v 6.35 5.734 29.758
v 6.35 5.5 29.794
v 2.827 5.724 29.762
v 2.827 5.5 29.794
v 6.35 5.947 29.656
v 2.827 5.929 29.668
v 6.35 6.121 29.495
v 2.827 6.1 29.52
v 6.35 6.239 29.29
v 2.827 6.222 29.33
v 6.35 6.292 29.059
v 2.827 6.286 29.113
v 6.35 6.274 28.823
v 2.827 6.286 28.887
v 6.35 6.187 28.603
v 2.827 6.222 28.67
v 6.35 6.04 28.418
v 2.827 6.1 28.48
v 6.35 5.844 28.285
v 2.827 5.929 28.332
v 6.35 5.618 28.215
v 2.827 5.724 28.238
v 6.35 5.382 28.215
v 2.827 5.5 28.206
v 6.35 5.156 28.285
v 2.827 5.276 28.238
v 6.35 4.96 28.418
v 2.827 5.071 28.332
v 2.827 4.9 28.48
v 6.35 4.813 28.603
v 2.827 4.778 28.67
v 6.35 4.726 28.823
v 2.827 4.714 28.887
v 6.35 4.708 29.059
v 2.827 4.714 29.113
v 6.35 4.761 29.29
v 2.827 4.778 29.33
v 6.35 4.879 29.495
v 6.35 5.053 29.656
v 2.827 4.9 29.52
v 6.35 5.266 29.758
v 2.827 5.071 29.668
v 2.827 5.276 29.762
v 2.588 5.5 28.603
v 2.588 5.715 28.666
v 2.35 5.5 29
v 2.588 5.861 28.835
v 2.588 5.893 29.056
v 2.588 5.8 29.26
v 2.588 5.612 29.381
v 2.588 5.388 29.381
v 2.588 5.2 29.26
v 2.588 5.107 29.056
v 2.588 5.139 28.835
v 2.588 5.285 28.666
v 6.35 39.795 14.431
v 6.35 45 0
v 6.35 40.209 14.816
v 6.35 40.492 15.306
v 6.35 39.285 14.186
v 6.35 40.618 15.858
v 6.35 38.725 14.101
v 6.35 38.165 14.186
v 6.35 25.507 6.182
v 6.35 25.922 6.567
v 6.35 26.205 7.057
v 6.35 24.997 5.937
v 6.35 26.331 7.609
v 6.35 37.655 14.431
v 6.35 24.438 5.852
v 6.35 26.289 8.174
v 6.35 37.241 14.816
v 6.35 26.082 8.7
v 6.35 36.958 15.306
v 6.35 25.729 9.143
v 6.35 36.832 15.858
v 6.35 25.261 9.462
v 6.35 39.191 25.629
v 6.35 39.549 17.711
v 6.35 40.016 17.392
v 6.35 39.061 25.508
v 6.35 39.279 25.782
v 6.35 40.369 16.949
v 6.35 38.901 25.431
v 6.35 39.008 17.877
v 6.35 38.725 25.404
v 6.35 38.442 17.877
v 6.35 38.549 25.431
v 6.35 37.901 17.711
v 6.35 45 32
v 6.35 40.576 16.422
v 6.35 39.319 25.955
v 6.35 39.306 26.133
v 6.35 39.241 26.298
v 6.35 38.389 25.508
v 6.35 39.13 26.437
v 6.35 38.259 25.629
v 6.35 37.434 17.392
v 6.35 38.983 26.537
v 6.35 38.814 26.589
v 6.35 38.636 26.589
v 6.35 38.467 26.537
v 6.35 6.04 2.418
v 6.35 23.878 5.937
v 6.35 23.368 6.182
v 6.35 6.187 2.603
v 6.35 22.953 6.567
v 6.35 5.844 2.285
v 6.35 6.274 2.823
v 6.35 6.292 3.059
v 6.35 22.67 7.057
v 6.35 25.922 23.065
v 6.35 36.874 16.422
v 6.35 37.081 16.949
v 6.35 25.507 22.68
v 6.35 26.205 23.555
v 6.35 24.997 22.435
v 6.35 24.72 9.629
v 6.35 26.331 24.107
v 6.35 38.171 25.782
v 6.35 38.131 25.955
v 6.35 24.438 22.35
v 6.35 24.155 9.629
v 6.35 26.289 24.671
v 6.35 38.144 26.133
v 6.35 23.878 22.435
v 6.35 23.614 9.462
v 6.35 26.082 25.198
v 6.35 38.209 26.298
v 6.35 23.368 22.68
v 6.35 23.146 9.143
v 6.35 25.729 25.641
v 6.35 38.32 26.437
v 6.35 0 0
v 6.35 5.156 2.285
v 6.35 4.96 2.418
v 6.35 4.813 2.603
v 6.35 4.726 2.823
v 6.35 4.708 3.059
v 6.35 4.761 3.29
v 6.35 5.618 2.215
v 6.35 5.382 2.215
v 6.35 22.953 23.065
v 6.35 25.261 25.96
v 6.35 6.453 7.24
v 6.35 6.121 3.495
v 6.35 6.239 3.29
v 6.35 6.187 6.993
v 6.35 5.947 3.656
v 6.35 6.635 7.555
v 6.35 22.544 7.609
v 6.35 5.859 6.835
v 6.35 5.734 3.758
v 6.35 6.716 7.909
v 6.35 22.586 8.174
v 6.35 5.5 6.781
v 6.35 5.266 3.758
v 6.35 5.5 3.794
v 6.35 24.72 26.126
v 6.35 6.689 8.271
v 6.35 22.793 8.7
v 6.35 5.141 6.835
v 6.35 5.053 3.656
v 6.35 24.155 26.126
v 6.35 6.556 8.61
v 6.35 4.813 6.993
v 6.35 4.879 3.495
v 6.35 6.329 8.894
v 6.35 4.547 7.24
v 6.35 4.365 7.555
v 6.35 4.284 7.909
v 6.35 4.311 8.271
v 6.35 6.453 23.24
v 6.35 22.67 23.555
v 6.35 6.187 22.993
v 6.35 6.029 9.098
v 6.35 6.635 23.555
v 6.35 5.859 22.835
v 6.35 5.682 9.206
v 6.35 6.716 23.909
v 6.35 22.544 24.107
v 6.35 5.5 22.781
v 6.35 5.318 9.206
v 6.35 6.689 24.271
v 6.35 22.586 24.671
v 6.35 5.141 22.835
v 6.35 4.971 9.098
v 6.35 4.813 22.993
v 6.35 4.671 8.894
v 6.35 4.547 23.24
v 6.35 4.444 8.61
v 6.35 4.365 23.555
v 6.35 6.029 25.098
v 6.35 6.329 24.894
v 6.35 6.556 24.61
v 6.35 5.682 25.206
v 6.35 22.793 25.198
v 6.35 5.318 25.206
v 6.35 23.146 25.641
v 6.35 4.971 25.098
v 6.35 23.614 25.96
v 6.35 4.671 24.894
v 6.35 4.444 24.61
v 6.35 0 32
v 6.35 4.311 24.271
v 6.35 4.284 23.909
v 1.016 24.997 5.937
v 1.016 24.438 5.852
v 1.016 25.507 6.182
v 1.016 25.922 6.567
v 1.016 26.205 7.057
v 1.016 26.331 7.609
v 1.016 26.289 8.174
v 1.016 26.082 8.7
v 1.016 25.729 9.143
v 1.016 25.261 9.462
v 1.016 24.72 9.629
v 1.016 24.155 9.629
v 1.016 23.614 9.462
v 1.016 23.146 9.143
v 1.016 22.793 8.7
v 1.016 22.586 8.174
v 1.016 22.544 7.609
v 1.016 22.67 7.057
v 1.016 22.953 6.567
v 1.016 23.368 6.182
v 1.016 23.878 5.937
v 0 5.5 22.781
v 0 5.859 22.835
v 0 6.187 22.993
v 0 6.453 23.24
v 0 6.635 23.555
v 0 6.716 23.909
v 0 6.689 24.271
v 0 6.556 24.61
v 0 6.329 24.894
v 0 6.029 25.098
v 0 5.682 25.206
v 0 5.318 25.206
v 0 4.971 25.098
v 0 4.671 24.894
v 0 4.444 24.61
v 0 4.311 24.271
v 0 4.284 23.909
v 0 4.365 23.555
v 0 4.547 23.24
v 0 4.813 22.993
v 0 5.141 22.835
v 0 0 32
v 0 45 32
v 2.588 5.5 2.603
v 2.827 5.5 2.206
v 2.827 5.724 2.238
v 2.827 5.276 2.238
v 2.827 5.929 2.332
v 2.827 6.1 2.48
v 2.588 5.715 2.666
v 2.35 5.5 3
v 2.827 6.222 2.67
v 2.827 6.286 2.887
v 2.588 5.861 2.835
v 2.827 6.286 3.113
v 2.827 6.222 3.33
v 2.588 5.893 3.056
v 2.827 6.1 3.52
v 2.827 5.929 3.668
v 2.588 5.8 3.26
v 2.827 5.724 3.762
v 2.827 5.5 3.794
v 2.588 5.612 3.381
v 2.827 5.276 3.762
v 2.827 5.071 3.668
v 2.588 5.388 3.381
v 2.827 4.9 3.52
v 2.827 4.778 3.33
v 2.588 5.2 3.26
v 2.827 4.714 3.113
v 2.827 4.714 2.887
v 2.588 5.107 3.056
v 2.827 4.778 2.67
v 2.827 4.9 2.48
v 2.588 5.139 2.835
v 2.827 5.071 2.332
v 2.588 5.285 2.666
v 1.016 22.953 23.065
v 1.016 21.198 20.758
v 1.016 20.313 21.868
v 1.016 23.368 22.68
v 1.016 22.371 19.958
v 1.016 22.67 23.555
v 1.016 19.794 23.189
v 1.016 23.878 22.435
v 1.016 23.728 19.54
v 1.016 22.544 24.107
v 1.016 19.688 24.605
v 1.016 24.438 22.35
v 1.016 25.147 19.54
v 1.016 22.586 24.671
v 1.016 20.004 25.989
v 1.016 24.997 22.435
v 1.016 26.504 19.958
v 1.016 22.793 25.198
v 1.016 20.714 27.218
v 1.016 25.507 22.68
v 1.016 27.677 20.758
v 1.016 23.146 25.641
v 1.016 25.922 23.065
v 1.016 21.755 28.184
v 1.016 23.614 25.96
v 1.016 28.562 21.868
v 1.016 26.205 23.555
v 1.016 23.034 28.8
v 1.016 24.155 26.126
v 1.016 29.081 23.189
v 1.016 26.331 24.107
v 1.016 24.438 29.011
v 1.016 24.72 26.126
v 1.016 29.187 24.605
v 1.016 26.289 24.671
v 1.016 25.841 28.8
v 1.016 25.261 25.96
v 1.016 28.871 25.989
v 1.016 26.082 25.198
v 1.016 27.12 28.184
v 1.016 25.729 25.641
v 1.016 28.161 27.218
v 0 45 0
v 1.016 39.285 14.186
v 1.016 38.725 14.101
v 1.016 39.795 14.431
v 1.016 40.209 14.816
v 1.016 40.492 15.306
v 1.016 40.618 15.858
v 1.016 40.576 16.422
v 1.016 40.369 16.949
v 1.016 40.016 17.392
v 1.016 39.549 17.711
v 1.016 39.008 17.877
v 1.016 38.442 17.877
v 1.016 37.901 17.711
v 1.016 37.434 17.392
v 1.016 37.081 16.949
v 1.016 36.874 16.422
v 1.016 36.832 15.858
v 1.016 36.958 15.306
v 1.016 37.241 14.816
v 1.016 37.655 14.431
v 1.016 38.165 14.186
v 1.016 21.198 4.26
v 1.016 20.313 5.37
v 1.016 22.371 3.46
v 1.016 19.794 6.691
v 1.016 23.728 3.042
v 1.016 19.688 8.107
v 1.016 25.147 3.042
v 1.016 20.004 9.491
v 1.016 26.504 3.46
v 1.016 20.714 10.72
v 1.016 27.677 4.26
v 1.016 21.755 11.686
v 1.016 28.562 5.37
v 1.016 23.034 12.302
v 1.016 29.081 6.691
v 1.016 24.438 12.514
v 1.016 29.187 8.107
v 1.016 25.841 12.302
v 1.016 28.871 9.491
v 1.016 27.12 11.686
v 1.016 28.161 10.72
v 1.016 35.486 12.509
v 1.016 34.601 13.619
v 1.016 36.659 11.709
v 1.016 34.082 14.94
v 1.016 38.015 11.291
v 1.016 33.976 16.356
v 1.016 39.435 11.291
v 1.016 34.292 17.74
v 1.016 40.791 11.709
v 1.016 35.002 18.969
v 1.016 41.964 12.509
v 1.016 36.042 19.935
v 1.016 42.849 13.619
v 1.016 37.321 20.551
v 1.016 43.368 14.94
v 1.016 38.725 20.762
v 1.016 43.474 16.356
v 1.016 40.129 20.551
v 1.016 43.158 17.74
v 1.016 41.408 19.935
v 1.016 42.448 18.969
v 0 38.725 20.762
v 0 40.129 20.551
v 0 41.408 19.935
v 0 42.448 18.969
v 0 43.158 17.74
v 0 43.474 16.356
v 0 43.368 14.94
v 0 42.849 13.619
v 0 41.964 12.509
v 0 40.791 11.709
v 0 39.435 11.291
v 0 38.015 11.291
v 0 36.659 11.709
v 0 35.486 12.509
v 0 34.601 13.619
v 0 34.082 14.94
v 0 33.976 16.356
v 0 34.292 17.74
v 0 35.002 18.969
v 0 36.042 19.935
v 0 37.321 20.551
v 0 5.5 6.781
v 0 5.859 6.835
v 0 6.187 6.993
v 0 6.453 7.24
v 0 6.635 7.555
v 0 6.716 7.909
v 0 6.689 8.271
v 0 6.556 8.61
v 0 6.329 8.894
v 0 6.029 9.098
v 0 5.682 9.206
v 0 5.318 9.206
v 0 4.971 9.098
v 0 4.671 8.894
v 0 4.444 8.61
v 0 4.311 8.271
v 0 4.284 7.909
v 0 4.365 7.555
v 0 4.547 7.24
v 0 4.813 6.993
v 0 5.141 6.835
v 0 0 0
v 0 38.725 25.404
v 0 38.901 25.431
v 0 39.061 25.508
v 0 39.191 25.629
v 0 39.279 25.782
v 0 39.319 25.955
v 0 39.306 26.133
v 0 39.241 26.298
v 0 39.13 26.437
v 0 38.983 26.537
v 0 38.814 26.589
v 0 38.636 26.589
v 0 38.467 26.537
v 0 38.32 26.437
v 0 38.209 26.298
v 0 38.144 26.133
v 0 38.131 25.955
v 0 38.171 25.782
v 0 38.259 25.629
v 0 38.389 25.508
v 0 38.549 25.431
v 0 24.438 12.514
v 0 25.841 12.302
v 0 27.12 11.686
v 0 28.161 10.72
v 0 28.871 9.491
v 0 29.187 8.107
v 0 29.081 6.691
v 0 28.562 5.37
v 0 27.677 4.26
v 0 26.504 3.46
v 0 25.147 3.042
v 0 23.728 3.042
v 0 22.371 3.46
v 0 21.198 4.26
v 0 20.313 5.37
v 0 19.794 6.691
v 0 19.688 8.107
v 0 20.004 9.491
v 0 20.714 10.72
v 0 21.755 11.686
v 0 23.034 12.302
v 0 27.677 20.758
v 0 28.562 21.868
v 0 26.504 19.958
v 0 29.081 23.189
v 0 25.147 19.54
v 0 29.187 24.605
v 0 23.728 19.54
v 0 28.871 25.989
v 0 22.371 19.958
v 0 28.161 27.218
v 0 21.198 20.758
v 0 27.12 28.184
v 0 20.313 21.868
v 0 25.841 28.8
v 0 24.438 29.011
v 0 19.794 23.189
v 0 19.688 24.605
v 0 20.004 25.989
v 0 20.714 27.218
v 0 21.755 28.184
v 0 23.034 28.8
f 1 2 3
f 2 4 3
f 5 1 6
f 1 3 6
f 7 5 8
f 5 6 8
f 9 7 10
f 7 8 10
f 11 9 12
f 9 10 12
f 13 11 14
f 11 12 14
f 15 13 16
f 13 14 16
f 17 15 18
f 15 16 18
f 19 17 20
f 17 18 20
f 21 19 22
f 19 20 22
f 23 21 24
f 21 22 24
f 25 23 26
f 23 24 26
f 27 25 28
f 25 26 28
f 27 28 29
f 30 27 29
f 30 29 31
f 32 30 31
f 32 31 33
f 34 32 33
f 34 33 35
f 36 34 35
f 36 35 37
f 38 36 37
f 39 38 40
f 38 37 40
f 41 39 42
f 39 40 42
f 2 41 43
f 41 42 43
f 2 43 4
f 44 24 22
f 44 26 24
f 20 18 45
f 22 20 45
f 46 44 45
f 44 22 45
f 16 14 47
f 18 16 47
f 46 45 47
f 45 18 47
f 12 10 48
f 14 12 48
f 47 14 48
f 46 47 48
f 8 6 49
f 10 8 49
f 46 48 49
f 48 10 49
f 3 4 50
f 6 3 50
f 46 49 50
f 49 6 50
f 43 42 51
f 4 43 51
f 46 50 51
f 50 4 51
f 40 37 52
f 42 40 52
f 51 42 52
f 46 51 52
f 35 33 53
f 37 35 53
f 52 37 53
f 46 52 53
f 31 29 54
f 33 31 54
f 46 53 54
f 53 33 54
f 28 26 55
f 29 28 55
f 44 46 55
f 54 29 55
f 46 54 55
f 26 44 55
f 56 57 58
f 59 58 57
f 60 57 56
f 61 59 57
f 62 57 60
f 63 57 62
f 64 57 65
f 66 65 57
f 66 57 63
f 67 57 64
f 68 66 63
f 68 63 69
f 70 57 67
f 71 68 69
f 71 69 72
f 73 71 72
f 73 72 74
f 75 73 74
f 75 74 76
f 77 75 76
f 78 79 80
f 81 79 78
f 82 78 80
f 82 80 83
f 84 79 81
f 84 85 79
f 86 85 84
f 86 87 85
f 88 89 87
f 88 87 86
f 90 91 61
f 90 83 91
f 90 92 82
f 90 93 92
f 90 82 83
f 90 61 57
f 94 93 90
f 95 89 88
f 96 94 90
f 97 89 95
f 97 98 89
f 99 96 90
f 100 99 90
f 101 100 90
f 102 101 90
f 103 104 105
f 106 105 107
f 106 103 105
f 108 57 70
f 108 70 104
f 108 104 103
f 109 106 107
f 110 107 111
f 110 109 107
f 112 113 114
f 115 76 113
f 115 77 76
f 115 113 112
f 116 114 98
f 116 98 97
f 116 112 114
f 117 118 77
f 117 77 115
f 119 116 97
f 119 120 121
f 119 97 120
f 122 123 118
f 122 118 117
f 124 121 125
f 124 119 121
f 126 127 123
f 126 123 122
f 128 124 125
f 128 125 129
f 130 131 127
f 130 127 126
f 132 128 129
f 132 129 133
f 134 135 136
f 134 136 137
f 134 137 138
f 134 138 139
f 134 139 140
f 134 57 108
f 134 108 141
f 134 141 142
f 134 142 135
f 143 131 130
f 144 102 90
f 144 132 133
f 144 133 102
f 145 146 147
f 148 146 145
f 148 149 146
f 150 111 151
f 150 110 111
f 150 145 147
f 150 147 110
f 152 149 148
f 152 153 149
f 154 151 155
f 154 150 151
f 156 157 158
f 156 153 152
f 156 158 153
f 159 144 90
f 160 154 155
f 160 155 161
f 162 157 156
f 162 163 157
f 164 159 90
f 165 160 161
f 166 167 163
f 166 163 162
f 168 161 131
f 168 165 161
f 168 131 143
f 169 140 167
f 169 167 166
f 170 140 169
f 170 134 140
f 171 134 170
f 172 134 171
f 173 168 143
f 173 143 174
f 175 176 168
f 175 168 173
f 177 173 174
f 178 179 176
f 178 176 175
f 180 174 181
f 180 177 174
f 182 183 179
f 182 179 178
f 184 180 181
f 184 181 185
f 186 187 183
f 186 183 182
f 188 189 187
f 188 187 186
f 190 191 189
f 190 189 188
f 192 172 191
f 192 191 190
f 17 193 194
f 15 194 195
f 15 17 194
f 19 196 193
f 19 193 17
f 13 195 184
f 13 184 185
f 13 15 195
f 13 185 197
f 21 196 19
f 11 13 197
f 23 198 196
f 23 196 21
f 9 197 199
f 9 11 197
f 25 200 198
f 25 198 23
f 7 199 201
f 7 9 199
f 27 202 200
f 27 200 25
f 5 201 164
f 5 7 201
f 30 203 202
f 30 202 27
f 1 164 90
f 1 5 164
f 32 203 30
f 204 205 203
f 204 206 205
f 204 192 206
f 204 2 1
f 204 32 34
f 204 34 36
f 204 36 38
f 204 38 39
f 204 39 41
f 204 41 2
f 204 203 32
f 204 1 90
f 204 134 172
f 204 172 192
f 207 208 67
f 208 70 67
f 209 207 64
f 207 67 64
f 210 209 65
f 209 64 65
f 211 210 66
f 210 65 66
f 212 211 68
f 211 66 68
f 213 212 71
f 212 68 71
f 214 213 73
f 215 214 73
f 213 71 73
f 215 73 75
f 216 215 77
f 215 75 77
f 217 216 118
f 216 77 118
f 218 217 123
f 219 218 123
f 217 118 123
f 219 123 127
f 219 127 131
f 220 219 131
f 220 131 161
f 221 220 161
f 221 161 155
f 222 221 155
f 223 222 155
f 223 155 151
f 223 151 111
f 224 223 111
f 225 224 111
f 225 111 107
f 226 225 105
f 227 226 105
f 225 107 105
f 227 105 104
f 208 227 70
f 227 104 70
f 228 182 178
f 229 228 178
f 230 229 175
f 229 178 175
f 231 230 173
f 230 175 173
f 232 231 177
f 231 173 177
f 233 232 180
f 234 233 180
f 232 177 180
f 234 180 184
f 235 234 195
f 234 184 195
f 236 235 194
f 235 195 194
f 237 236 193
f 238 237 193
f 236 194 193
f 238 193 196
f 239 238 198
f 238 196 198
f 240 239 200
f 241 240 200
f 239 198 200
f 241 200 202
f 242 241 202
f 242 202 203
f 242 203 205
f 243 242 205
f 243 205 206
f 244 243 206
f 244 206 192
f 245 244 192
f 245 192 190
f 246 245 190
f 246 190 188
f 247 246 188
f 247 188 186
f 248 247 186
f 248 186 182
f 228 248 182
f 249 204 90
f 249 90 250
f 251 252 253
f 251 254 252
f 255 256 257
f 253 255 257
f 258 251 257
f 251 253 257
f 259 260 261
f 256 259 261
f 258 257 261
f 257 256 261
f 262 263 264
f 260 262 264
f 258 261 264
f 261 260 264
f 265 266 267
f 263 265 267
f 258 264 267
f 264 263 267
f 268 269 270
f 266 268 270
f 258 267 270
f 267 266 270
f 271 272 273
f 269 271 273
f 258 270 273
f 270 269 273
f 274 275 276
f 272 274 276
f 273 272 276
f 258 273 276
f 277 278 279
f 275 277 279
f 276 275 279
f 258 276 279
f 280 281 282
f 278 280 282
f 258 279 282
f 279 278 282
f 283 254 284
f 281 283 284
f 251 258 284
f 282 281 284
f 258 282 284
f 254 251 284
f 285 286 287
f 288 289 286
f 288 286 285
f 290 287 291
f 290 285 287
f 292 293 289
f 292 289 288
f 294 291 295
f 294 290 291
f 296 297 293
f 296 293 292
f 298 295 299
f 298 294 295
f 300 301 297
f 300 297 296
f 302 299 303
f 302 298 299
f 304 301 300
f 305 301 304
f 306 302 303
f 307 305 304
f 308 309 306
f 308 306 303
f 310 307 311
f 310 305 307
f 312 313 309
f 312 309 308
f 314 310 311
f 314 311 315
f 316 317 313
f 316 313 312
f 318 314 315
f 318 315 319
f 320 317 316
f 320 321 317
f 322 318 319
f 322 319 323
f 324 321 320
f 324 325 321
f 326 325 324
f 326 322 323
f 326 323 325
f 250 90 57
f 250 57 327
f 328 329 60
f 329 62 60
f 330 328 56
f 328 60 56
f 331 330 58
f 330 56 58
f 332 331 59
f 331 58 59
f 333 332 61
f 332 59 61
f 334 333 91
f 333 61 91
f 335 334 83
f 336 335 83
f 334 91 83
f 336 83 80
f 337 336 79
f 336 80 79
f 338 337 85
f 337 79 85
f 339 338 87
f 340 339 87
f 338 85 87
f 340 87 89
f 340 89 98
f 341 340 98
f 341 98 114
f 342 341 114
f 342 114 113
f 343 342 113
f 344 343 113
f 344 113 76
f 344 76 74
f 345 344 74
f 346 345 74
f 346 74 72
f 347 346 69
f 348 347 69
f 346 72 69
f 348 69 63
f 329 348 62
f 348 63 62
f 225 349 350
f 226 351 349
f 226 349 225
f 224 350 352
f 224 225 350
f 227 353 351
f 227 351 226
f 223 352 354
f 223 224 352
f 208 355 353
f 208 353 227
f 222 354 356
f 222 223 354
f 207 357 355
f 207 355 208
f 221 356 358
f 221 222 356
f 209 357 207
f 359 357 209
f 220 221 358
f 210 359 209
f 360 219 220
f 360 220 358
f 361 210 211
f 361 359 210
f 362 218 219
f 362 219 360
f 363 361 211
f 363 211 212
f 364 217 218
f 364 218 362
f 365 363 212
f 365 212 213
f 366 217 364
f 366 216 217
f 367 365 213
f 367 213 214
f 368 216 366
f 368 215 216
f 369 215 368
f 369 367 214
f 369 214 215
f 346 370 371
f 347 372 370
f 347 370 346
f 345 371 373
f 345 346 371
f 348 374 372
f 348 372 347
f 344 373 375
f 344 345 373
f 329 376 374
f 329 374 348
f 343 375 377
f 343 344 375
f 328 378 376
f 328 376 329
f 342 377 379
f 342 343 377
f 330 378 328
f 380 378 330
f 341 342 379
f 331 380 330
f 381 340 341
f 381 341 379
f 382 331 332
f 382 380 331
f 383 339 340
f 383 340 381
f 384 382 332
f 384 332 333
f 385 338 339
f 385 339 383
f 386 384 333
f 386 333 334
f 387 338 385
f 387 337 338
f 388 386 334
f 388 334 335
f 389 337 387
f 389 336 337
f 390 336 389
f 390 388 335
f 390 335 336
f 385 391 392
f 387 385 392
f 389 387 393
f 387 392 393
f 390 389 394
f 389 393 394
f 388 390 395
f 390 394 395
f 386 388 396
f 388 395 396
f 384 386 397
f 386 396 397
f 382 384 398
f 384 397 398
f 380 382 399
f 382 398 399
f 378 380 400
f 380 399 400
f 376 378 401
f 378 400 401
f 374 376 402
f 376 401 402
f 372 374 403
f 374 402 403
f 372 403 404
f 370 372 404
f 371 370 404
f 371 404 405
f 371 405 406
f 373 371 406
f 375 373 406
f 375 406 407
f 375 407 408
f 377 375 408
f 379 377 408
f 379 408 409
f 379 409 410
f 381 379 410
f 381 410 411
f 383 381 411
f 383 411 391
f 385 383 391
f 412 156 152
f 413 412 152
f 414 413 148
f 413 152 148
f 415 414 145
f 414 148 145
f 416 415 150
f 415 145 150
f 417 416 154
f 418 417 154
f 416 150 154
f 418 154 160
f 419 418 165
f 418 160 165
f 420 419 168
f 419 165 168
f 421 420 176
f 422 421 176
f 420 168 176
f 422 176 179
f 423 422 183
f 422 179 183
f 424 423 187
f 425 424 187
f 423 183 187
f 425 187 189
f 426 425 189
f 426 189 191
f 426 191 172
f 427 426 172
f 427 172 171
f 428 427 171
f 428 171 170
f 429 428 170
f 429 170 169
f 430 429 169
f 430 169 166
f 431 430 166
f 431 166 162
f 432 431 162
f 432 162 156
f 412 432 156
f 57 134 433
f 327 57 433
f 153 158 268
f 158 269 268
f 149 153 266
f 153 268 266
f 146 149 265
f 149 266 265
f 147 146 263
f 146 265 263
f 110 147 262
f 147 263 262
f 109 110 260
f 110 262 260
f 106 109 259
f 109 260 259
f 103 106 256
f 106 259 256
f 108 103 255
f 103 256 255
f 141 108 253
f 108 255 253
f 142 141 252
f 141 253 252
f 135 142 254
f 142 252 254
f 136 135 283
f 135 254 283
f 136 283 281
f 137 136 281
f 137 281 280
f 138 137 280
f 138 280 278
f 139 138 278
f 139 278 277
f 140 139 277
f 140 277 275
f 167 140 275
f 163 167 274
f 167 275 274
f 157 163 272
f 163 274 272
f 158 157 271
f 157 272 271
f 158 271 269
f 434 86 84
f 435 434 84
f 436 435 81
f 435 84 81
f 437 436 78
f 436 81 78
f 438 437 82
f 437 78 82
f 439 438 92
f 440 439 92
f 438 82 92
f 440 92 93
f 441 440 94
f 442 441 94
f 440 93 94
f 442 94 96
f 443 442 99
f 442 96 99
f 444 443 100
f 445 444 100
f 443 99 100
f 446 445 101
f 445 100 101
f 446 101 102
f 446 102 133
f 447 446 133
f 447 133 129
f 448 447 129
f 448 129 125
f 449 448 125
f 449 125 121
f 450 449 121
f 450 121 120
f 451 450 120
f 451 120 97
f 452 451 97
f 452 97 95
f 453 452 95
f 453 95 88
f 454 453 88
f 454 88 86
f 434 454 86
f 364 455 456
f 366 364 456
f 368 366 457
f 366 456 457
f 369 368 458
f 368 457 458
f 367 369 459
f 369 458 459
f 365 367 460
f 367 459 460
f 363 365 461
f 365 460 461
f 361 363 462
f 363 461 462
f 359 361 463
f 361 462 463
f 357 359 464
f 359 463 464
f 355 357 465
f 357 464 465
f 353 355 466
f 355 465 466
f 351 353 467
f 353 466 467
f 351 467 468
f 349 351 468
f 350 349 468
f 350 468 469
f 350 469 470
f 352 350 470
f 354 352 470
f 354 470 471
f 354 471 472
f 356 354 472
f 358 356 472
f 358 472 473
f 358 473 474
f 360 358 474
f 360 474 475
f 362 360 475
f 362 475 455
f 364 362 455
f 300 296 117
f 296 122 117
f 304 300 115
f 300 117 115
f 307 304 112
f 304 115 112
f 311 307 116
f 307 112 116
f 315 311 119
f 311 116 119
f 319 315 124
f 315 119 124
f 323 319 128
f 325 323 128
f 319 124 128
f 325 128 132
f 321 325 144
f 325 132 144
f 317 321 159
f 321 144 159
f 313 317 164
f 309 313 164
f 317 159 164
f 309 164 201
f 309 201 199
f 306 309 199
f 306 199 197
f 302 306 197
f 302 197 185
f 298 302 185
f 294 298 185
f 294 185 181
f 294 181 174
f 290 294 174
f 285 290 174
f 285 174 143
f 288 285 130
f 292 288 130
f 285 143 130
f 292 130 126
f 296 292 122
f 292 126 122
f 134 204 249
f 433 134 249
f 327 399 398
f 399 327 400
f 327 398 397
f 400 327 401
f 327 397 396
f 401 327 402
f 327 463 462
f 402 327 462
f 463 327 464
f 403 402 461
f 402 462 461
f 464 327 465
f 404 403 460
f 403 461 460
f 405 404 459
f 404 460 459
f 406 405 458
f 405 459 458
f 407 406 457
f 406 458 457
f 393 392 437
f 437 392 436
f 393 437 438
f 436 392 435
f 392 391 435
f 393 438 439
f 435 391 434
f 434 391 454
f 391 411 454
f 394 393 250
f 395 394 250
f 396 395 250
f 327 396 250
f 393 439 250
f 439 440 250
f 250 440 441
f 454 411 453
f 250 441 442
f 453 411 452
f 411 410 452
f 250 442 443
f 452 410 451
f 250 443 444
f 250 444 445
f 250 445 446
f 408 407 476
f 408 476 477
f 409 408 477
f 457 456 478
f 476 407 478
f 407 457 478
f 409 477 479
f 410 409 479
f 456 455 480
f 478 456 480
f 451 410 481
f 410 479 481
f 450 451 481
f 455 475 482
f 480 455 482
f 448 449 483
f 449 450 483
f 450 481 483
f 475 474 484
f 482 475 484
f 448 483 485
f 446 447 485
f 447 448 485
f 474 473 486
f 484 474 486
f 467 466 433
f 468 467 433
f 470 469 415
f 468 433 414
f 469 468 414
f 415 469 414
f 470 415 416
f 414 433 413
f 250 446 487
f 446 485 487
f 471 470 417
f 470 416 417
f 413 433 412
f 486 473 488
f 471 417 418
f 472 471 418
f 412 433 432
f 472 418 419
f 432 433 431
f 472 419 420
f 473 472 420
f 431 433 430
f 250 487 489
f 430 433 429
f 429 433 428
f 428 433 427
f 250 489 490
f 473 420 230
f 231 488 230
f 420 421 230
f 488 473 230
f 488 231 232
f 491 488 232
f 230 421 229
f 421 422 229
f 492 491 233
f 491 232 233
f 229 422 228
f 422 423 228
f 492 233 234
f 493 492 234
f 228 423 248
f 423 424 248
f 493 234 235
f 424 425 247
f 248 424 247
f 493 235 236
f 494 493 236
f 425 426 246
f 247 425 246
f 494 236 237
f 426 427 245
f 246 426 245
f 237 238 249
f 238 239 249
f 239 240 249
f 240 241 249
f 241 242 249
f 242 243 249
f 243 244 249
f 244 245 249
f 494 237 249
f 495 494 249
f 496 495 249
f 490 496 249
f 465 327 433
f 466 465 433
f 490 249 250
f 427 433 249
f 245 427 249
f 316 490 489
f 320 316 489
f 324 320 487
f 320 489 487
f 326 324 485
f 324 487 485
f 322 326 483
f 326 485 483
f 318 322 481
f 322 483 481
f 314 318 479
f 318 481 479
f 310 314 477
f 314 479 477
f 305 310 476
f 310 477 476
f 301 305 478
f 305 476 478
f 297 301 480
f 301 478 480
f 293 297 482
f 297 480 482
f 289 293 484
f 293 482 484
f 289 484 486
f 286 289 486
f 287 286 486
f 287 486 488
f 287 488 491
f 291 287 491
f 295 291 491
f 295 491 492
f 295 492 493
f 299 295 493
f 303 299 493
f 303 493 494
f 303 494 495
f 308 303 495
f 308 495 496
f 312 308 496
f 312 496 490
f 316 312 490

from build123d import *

# Parameters (mm, degrees)
SKETCH26_W                                          = 6.35
SKETCH26_H                                          = 32
BOSS_EXTRUDE2_DEPTH                                 = 45
CUT_EXTRUDE7_REACH                                  = 8.35
SKETCH27_R                                          = 1.595
CBORE_FOR_6_BINDING_HEAD_MACHINE_SCREW1_D           = 3.7973
CBORE_FOR_6_BINDING_HEAD_MACHINE_SCREW1_DEPTH       = 46.5
CBORE_FOR_6_BINDING_HEAD_MACHINE_SCREW1_CBORE_D     = 9.525
CBORE_FOR_6_BINDING_HEAD_MACHINE_SCREW1_CBORE_DEPTH = 1.016
CBORE_FOR_6_BINDING_HEAD_MACHINE_SCREW1_TIP         = 1.140824014
F_0_80_TAPPED_HOLE1_D                               = 1.19126
F_2_CLEARANCE_HOLE1_D                               = 2.4384
F_2_CLEARANCE_HOLE1_DEPTH                           = 20.32
F_2_CLEARANCE_HOLE1_TIP                             = 0.732569267
F_1_16_0_0625_DOWEL_HOLE1_D                         = 1.5875
F_1_16_0_0625_DOWEL_HOLE1_DEPTH                     = 3.523066884
F_1_16_0_0625_DOWEL_HOLE1_TIP                       = 0.476933116


with BuildPart() as part:
    # Sketch26 → Boss-Extrude2 (new body)
    with BuildSketch(Plane(origin=(0, 0, 0), x_dir=(-1, 0, 0), z_dir=(0, 1, 0))):
        with Locations((-3.175, 16)):
            Rectangle(SKETCH26_W, SKETCH26_H)
    extrude(amount=BOSS_EXTRUDE2_DEPTH)

    # Sketch27 → Cut-Extrude7 (cut, up to next)
    with BuildSketch(Plane.ZY, mode=Mode.PRIVATE) as cut_extrude7_sk1:
        with Locations((16, 38.725)):
            Circle(SKETCH27_R)
    cut_extrude7_tool1 = extrude(cut_extrude7_sk1.sketch, amount=-CUT_EXTRUDE7_REACH, mode=Mode.PRIVATE) & part.part
    add(cut_extrude7_tool1.solids().sort_by_distance((0, 38.725, 16))[0], mode=Mode.SUBTRACT)
    # Sketch27 → Cut-Extrude7 (cut, up to next)
    with BuildSketch(Plane.ZY, mode=Mode.PRIVATE) as cut_extrude7_sk2:
        with Locations((24.248891971, 24.4375)):
            Circle(SKETCH27_R)
    cut_extrude7_tool2 = extrude(cut_extrude7_sk2.sketch, amount=-CUT_EXTRUDE7_REACH, mode=Mode.PRIVATE) & part.part
    add(cut_extrude7_tool2.solids().sort_by_distance((0, 24.4375, 24.248892))[0], mode=Mode.SUBTRACT)
    # Sketch27 → Cut-Extrude7 (cut, up to next)
    with BuildSketch(Plane.ZY, mode=Mode.PRIVATE) as cut_extrude7_sk3:
        with Locations((7.751108029, 24.4375)):
            Circle(SKETCH27_R)
    cut_extrude7_tool3 = extrude(cut_extrude7_sk3.sketch, amount=-CUT_EXTRUDE7_REACH, mode=Mode.PRIVATE) & part.part
    add(cut_extrude7_tool3.solids().sort_by_distance((0, 24.4375, 7.751108))[0], mode=Mode.SUBTRACT)

    # CBORE for #6 Binding Head Machine Screw1
    with Locations(Plane.ZY):
        with Locations((16, 38.725), (24.248891971, 24.4375), (7.751108029, 24.4375)):
            CounterBoreHole(CBORE_FOR_6_BINDING_HEAD_MACHINE_SCREW1_D / 2, CBORE_FOR_6_BINDING_HEAD_MACHINE_SCREW1_CBORE_D / 2, CBORE_FOR_6_BINDING_HEAD_MACHINE_SCREW1_CBORE_DEPTH, depth=CBORE_FOR_6_BINDING_HEAD_MACHINE_SCREW1_DEPTH)
            with Locations((0, 0, -(CBORE_FOR_6_BINDING_HEAD_MACHINE_SCREW1_DEPTH + CBORE_FOR_6_BINDING_HEAD_MACHINE_SCREW1_TIP / 2))):  # 118° drill point
                Cone(0, CBORE_FOR_6_BINDING_HEAD_MACHINE_SCREW1_D / 2, CBORE_FOR_6_BINDING_HEAD_MACHINE_SCREW1_TIP, mode=Mode.SUBTRACT)

    # #0-80 Tapped Hole1 (through all)
    with Locations(Plane.ZY):
        with Locations((26, 38.725)):
            Hole(F_0_80_TAPPED_HOLE1_D / 2)

    # #2 Clearance Hole1
    with Locations(Plane.ZY):
        with Locations((8, 5.5), (24, 5.5)):
            Hole(F_2_CLEARANCE_HOLE1_D / 2, depth=F_2_CLEARANCE_HOLE1_DEPTH)
            with Locations((0, 0, -(F_2_CLEARANCE_HOLE1_DEPTH + F_2_CLEARANCE_HOLE1_TIP / 2))):  # 118° drill point
                Cone(0, F_2_CLEARANCE_HOLE1_D / 2, F_2_CLEARANCE_HOLE1_TIP, mode=Mode.SUBTRACT)

    # 1/16 (0.0625) Dowel Hole1
    with Locations(Plane(origin=(6.35, 0, 0), x_dir=(0, 0, -1), z_dir=(1, 0, 0))):
        with Locations((-29, 5.5), (-3, 5.5)):
            Hole(F_1_16_0_0625_DOWEL_HOLE1_D / 2, depth=F_1_16_0_0625_DOWEL_HOLE1_DEPTH)
            with Locations((0, 0, -(F_1_16_0_0625_DOWEL_HOLE1_DEPTH + F_1_16_0_0625_DOWEL_HOLE1_TIP / 2))):  # 118° drill point
                Cone(0, F_1_16_0_0625_DOWEL_HOLE1_D / 2, F_1_16_0_0625_DOWEL_HOLE1_TIP, mode=Mode.SUBTRACT)


solid = part.part
